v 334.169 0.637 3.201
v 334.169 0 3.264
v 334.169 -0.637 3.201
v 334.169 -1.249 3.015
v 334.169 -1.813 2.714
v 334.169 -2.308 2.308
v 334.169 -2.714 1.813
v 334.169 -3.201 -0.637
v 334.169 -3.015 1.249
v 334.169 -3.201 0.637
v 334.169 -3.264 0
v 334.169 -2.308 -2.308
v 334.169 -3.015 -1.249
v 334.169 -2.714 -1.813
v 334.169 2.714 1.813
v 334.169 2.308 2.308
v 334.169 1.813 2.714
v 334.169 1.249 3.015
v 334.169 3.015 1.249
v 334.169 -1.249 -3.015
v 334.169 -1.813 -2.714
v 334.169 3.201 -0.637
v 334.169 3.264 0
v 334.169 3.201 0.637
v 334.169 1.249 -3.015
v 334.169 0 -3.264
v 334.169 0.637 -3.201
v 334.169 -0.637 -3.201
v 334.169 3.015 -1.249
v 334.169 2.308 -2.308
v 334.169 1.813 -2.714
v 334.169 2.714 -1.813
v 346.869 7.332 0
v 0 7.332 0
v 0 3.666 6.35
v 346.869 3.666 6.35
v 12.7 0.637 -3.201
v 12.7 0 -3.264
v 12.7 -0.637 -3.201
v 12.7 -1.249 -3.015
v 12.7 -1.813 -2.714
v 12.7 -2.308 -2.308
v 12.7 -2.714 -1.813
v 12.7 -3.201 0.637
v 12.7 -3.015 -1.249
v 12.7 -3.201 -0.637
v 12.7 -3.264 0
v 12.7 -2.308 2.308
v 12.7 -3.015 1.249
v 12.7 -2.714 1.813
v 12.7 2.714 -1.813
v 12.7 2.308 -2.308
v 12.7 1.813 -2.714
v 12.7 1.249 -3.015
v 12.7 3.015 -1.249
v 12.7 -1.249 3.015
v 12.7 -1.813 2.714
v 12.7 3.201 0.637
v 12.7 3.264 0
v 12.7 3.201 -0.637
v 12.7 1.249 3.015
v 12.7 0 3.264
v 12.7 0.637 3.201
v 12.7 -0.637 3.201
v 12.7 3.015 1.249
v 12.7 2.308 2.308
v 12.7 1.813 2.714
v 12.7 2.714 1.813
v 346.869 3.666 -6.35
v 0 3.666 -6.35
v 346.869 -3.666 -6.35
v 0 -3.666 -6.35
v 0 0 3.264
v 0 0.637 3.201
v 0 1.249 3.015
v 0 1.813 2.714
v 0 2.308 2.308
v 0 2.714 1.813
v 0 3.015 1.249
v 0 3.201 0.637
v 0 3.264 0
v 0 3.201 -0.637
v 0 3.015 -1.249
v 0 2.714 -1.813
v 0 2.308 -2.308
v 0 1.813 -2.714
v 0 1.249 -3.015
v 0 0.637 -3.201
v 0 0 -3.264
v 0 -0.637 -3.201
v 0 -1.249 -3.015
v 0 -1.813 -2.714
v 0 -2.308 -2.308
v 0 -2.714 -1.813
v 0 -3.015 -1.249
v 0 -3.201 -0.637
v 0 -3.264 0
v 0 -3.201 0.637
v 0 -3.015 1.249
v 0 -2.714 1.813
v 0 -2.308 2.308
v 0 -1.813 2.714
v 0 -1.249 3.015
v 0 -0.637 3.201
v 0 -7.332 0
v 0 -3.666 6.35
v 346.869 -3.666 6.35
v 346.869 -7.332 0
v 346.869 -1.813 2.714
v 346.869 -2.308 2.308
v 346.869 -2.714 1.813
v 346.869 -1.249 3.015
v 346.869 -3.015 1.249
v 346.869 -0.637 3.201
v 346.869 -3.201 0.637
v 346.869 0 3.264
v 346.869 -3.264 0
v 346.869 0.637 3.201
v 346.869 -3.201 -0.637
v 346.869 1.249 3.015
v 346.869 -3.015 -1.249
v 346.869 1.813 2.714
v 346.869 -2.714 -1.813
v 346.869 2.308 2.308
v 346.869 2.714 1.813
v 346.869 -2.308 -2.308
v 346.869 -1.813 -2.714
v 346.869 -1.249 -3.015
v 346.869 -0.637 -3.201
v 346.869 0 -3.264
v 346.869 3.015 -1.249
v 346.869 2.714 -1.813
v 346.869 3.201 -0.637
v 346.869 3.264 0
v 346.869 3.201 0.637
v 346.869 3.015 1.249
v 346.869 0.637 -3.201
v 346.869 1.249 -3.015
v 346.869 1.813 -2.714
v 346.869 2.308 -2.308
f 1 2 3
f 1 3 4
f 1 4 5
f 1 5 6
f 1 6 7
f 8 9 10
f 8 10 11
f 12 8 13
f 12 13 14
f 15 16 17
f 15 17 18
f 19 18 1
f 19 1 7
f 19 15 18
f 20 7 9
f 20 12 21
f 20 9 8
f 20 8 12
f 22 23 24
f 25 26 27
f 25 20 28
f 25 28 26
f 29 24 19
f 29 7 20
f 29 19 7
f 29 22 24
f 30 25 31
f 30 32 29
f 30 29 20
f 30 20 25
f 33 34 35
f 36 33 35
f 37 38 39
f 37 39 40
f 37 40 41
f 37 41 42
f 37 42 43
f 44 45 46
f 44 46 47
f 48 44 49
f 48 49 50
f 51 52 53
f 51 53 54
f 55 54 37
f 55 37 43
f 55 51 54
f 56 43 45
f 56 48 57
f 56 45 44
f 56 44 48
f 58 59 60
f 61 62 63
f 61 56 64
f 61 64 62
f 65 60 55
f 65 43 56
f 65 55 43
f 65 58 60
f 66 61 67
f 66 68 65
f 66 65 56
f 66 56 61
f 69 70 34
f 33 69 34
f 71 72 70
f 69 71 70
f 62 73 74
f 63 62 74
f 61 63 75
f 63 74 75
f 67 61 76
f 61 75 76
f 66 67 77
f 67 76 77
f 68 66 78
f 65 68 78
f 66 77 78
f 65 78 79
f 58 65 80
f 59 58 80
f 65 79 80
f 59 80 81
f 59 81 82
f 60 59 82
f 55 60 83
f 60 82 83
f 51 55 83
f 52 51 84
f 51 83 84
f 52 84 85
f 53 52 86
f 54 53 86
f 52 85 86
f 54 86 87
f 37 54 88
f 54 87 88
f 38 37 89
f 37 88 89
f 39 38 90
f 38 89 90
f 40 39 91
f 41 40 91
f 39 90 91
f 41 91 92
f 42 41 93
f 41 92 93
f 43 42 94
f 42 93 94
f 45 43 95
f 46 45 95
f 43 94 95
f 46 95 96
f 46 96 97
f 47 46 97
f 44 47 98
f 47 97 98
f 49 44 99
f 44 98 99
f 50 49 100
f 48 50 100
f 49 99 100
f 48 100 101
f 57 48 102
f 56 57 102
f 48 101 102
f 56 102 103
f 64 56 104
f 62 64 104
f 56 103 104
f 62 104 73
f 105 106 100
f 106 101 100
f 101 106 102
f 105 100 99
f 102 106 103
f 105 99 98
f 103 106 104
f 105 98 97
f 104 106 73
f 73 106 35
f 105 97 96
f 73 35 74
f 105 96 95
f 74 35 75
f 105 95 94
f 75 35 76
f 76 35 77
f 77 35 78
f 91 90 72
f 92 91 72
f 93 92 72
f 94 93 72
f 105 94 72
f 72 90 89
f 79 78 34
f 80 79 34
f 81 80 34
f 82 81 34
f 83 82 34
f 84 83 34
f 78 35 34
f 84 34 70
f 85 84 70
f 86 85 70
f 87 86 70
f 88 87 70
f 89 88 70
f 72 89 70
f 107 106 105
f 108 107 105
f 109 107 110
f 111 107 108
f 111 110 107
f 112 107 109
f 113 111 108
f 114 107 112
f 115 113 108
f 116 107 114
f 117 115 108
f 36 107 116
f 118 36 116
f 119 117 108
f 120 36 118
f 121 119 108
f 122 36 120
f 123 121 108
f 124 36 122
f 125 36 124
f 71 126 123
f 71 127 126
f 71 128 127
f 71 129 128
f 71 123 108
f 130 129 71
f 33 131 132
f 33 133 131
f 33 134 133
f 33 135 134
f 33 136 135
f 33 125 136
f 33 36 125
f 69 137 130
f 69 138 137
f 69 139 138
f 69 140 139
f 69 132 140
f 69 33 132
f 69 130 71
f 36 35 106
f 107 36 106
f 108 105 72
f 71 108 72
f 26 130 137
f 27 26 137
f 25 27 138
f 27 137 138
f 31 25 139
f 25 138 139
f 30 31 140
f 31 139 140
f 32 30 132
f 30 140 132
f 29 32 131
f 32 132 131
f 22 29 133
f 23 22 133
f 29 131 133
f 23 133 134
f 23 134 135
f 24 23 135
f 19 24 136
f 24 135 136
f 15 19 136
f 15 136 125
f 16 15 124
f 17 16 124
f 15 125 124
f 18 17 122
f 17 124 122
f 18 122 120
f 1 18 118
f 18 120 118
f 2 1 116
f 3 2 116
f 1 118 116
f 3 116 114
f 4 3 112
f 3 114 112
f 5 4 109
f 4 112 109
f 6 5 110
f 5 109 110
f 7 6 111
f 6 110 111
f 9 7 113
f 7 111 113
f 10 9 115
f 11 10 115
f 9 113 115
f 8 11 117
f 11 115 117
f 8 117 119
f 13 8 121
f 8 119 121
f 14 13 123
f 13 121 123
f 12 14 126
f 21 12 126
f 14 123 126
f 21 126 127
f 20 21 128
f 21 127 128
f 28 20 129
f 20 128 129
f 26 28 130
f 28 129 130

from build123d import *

# Parameters (mm, degrees)
BOSS_EXTRUDE1_DEPTH = 346.86875
SKETCH2_R           = 3.2639
CUT_EXTRUDE1_DEPTH  = 12.7
SKETCH3_R           = 3.2639
CUT_EXTRUDE2_DEPTH  = 12.7


with BuildPart() as part:
    # Sketch1 → Boss-Extrude1 (new body)
    with BuildSketch(Plane(origin=(0, 0, 0), x_dir=(0, 0, -1), z_dir=(1, 0, 0))):
        Polygon((0, 7.332348419), (-6.35, 3.666174209), (-6.35, -3.666174209), (0, -7.332348419), (6.35, -3.666174209), (6.35, 3.666174209), align=None)
    extrude(amount=BOSS_EXTRUDE1_DEPTH)

    # Sketch2 → Cut-Extrude1 (cut)
    with BuildSketch(Plane(origin=(346.86875, 0, 0), x_dir=(0, 0, -1), z_dir=(1, 0, 0))):
        Circle(SKETCH2_R)
    extrude(amount=-CUT_EXTRUDE1_DEPTH, mode=Mode.SUBTRACT)

    # Sketch3 → Cut-Extrude2 (cut)
    with BuildSketch(Plane.ZY):
        Circle(SKETCH3_R)
    extrude(amount=-CUT_EXTRUDE2_DEPTH, mode=Mode.SUBTRACT)


solid = part.part
